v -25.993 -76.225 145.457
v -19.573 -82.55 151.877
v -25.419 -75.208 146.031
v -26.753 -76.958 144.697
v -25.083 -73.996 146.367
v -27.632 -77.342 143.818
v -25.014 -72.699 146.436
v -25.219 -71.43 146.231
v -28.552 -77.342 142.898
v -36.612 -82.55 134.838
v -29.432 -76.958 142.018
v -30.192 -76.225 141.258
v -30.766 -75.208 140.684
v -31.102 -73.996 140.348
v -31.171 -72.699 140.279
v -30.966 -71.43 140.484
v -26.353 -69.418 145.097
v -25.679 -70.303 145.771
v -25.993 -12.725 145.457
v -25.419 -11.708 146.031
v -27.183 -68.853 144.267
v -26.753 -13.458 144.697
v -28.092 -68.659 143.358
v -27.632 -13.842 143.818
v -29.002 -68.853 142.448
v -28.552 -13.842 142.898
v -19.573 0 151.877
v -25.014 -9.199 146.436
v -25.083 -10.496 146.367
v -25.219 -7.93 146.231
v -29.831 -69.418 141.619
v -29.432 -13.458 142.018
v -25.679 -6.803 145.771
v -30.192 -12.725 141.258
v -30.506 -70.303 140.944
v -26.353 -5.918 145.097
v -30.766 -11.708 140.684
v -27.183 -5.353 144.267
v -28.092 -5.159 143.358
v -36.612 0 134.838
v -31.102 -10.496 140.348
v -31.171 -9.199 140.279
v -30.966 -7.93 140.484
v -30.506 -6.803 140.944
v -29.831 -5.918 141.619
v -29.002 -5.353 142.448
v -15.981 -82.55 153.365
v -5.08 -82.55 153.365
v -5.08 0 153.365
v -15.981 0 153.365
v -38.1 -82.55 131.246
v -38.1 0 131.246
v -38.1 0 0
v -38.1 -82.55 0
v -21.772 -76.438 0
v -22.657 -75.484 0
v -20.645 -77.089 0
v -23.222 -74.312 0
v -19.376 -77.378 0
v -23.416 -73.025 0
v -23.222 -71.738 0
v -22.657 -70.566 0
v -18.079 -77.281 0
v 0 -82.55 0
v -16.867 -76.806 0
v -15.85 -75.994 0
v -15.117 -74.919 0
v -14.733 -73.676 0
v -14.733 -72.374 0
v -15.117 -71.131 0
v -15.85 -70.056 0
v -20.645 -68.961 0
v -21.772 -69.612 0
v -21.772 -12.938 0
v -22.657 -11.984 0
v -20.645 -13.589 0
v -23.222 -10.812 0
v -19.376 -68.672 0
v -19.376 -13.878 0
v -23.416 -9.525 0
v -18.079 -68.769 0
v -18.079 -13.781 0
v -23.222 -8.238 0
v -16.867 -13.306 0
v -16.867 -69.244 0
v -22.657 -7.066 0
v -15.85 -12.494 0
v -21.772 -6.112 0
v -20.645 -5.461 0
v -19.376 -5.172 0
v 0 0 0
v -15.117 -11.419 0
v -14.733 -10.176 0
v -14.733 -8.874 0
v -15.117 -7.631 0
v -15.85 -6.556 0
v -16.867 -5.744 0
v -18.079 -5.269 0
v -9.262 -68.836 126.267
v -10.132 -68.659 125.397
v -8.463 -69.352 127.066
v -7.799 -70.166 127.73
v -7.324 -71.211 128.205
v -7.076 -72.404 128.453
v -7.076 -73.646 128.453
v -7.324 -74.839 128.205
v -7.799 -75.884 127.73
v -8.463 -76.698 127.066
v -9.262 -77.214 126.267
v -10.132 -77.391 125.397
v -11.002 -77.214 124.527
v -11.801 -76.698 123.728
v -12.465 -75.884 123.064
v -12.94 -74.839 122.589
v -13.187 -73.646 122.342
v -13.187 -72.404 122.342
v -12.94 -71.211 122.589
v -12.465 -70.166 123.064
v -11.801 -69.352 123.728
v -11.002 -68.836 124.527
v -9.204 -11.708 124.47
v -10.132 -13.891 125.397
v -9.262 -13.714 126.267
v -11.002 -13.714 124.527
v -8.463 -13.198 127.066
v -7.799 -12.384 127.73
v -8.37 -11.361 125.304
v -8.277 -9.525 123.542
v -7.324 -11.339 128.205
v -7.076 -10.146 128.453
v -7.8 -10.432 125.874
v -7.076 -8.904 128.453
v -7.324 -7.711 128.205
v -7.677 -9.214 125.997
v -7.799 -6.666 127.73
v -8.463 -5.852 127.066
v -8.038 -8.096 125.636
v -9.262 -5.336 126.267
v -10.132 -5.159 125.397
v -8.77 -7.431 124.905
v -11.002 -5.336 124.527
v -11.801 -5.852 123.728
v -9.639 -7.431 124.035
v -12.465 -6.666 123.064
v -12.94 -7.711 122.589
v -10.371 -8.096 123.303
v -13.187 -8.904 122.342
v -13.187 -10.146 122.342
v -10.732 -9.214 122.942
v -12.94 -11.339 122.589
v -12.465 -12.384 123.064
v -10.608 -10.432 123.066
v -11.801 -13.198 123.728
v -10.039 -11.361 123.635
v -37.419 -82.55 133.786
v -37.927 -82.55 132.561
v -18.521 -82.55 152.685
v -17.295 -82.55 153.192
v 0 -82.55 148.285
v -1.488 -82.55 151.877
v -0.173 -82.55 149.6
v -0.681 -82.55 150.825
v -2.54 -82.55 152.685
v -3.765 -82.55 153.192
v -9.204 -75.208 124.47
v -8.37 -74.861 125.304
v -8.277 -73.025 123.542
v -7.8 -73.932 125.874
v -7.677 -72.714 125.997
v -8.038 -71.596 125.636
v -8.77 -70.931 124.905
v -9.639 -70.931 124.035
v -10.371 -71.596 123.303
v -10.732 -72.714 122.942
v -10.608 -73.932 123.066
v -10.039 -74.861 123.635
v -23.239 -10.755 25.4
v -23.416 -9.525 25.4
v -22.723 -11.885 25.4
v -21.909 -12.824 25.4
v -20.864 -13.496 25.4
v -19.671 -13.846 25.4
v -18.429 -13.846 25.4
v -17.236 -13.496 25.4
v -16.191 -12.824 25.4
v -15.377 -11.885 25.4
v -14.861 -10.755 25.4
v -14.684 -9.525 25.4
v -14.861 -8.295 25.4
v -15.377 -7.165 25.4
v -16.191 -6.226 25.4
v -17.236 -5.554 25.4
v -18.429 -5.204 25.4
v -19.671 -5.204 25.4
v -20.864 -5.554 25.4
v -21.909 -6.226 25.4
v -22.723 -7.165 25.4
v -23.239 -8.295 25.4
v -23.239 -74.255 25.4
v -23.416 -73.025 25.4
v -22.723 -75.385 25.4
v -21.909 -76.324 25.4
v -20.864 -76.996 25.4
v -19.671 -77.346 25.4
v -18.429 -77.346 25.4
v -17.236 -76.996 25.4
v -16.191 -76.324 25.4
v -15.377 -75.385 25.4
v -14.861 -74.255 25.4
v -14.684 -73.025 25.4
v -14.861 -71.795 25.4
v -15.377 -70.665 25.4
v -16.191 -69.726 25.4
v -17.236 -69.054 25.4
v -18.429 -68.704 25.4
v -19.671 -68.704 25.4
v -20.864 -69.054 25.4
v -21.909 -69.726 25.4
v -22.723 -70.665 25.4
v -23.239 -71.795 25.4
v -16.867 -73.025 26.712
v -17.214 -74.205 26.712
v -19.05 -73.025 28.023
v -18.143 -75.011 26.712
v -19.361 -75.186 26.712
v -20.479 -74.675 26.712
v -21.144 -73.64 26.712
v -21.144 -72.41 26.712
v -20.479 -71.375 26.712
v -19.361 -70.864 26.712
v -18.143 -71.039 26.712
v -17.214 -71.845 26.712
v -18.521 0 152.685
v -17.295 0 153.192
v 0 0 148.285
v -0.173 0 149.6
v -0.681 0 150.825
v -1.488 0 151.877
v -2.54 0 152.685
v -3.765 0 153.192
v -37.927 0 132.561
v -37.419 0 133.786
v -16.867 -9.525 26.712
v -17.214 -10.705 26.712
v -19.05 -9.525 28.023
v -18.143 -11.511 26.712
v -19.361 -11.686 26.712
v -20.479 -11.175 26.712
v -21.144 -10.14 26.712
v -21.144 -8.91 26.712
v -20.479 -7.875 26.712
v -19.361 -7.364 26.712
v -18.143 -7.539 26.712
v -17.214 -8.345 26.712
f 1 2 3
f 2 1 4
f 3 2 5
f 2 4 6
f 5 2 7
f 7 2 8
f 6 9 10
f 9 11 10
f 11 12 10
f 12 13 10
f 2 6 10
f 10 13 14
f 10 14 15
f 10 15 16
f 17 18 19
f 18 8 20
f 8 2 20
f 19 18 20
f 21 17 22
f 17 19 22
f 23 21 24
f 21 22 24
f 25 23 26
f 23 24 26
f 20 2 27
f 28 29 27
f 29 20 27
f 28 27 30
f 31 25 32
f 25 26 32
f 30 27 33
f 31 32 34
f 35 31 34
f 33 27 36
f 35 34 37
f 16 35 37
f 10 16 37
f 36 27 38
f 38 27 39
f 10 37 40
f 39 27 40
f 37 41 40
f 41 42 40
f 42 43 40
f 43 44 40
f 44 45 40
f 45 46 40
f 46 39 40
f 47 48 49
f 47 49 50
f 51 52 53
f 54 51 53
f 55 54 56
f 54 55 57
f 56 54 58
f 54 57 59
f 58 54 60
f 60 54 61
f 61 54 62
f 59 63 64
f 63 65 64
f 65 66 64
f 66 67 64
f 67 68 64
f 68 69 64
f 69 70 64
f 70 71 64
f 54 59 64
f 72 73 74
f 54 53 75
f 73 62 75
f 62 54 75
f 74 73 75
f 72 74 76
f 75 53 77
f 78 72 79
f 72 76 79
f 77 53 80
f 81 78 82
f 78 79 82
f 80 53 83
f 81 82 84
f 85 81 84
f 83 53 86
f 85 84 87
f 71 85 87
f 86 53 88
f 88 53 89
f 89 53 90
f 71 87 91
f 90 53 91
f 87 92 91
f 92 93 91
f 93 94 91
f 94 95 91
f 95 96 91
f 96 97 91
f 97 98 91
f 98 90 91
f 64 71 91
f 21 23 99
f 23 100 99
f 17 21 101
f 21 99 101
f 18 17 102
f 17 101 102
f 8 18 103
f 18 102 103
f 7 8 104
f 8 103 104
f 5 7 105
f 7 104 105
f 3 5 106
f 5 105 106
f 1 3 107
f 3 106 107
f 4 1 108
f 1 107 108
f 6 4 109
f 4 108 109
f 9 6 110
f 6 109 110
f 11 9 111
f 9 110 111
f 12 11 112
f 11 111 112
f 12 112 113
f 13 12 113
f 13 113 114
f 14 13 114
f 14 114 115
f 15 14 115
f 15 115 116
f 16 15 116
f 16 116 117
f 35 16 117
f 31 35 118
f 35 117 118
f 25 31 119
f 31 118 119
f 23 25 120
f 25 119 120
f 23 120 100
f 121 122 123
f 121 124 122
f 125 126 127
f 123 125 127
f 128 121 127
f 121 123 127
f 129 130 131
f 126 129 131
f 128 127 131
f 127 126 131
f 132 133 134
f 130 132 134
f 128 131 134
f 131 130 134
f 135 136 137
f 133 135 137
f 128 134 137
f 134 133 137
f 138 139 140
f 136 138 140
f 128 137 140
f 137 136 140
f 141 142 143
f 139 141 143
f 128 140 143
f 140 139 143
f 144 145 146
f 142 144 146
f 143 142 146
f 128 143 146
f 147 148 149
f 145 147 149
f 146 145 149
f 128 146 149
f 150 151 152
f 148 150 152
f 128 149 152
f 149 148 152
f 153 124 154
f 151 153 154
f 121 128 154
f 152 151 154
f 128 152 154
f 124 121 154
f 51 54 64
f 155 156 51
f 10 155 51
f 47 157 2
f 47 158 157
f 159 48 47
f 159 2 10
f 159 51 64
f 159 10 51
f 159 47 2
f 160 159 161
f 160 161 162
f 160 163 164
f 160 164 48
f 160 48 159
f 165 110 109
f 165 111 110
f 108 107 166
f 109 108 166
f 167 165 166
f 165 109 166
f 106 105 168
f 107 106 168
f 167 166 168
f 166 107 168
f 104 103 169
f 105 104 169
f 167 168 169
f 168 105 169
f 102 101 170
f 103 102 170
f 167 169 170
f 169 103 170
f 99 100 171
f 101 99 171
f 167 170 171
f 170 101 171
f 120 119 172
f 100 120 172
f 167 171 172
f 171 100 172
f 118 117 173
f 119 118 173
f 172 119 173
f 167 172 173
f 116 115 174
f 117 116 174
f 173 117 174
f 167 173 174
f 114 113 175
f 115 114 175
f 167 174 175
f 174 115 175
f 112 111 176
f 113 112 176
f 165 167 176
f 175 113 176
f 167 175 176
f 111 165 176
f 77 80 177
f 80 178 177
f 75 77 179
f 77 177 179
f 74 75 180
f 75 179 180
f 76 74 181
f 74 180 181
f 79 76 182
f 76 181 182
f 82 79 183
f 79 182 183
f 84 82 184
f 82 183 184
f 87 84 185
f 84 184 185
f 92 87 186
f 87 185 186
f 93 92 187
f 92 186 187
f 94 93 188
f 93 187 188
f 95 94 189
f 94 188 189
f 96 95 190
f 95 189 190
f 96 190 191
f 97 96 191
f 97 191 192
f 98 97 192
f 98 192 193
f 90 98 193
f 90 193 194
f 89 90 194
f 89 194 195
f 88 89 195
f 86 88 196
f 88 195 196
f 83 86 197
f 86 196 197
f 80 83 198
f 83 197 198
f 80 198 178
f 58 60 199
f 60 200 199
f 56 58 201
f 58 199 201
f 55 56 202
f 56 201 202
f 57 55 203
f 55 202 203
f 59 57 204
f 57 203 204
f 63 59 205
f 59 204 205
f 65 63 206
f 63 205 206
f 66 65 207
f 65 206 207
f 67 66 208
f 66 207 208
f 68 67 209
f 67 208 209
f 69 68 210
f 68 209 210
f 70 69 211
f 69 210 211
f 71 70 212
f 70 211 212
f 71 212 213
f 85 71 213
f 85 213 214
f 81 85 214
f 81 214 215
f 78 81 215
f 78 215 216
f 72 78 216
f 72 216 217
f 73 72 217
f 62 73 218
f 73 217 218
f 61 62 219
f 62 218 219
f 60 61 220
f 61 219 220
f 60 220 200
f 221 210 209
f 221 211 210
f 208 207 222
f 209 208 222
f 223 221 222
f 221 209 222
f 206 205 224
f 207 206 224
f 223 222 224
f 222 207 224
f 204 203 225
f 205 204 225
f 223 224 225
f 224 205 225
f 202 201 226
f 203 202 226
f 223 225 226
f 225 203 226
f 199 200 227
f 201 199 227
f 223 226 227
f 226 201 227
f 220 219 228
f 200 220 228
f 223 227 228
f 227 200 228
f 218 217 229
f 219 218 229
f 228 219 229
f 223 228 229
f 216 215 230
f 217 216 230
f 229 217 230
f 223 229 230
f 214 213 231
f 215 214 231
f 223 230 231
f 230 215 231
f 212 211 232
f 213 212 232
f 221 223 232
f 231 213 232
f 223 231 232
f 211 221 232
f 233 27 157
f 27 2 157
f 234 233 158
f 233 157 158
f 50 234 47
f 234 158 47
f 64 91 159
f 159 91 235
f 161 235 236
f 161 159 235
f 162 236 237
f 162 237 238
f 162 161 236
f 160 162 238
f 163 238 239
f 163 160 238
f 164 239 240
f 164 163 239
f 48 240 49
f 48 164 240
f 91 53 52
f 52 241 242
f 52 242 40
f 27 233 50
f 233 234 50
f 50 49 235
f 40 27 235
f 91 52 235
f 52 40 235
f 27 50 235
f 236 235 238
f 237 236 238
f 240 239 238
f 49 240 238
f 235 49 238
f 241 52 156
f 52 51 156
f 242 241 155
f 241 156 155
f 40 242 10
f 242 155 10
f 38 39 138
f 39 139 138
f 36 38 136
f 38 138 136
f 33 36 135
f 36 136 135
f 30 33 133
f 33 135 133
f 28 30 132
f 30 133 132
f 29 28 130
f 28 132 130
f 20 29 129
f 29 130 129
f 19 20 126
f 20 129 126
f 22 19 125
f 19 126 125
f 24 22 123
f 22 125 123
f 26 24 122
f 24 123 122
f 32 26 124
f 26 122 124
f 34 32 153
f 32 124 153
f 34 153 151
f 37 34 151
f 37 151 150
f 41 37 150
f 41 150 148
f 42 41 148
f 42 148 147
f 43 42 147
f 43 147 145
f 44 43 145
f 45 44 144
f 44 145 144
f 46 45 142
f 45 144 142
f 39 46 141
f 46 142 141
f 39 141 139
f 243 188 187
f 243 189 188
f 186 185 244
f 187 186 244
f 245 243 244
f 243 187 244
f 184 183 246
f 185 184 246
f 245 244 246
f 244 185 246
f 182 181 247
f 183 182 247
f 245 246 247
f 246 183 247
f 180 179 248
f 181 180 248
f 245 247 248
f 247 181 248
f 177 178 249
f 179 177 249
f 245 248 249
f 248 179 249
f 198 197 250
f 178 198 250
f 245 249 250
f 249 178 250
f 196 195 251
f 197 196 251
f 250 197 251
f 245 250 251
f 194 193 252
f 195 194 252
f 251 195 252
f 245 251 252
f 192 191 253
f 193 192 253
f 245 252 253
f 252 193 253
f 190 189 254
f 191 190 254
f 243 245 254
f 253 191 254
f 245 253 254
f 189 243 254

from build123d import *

# Parameters (mm, degrees)
F1_DEPTH       = 82.55
F4_D           = 8.73125
F4_DEPTH       = 25.4
F4_TIP         = 2.6231321399
F4_ON_F3_D     = 8.73125
F4_ON_F3_DEPTH = 25.4
F4_ON_F3_TIP   = 2.6231321399
F5_R           = 5.08


with BuildPart() as f1:
    # F0 (on Front) → F1 (new body)
    with BuildSketch(Plane.XZ):
        Polygon((-38.1, 0), (0, 0), (0, 153.3652), (-18.0848, 153.3652), (-38.1, 133.35), align=None)
    extrude(amount=F1_DEPTH)

    # F4
    with Locations(Plane(origin=(-85.725, 0, 85.725), x_dir=(0, -1, 0), z_dir=(-0.7071067812, 0, 0.7071067812))):
        with Locations((73.025, 81.5048045548), (9.525, 81.5048045548)):
            Hole(F4_D / 2, depth=F4_DEPTH)
            with Locations((0, 0, -(F4_DEPTH + F4_TIP / 2))):  # 118° drill point
                Cone(0, F4_D / 2, F4_TIP, mode=Mode.SUBTRACT)

    # F4 on F3
    with Locations(Plane(origin=(0, 0, 0), x_dir=(1, 0, 0), z_dir=(0, 0, -1))):
        with Locations((-19.05, 73.025), (-19.05, 9.525)):
            Hole(F4_ON_F3_D / 2, depth=F4_ON_F3_DEPTH)
            with Locations((0, 0, -(F4_ON_F3_DEPTH + F4_ON_F3_TIP / 2))):  # 118° drill point
                Cone(0, F4_ON_F3_D / 2, F4_ON_F3_TIP, mode=Mode.SUBTRACT)

    # F5
    f5_edges = [f1.edges().sort_by_distance(p)[0] for p in [
        (-38.1, -41.275, 133.35),
        (-18.0848, -41.275, 153.3652),
        (0, -41.275, 153.3652),
    ]]
    fillet(f5_edges, radius=F5_R)


solid = f1.part
